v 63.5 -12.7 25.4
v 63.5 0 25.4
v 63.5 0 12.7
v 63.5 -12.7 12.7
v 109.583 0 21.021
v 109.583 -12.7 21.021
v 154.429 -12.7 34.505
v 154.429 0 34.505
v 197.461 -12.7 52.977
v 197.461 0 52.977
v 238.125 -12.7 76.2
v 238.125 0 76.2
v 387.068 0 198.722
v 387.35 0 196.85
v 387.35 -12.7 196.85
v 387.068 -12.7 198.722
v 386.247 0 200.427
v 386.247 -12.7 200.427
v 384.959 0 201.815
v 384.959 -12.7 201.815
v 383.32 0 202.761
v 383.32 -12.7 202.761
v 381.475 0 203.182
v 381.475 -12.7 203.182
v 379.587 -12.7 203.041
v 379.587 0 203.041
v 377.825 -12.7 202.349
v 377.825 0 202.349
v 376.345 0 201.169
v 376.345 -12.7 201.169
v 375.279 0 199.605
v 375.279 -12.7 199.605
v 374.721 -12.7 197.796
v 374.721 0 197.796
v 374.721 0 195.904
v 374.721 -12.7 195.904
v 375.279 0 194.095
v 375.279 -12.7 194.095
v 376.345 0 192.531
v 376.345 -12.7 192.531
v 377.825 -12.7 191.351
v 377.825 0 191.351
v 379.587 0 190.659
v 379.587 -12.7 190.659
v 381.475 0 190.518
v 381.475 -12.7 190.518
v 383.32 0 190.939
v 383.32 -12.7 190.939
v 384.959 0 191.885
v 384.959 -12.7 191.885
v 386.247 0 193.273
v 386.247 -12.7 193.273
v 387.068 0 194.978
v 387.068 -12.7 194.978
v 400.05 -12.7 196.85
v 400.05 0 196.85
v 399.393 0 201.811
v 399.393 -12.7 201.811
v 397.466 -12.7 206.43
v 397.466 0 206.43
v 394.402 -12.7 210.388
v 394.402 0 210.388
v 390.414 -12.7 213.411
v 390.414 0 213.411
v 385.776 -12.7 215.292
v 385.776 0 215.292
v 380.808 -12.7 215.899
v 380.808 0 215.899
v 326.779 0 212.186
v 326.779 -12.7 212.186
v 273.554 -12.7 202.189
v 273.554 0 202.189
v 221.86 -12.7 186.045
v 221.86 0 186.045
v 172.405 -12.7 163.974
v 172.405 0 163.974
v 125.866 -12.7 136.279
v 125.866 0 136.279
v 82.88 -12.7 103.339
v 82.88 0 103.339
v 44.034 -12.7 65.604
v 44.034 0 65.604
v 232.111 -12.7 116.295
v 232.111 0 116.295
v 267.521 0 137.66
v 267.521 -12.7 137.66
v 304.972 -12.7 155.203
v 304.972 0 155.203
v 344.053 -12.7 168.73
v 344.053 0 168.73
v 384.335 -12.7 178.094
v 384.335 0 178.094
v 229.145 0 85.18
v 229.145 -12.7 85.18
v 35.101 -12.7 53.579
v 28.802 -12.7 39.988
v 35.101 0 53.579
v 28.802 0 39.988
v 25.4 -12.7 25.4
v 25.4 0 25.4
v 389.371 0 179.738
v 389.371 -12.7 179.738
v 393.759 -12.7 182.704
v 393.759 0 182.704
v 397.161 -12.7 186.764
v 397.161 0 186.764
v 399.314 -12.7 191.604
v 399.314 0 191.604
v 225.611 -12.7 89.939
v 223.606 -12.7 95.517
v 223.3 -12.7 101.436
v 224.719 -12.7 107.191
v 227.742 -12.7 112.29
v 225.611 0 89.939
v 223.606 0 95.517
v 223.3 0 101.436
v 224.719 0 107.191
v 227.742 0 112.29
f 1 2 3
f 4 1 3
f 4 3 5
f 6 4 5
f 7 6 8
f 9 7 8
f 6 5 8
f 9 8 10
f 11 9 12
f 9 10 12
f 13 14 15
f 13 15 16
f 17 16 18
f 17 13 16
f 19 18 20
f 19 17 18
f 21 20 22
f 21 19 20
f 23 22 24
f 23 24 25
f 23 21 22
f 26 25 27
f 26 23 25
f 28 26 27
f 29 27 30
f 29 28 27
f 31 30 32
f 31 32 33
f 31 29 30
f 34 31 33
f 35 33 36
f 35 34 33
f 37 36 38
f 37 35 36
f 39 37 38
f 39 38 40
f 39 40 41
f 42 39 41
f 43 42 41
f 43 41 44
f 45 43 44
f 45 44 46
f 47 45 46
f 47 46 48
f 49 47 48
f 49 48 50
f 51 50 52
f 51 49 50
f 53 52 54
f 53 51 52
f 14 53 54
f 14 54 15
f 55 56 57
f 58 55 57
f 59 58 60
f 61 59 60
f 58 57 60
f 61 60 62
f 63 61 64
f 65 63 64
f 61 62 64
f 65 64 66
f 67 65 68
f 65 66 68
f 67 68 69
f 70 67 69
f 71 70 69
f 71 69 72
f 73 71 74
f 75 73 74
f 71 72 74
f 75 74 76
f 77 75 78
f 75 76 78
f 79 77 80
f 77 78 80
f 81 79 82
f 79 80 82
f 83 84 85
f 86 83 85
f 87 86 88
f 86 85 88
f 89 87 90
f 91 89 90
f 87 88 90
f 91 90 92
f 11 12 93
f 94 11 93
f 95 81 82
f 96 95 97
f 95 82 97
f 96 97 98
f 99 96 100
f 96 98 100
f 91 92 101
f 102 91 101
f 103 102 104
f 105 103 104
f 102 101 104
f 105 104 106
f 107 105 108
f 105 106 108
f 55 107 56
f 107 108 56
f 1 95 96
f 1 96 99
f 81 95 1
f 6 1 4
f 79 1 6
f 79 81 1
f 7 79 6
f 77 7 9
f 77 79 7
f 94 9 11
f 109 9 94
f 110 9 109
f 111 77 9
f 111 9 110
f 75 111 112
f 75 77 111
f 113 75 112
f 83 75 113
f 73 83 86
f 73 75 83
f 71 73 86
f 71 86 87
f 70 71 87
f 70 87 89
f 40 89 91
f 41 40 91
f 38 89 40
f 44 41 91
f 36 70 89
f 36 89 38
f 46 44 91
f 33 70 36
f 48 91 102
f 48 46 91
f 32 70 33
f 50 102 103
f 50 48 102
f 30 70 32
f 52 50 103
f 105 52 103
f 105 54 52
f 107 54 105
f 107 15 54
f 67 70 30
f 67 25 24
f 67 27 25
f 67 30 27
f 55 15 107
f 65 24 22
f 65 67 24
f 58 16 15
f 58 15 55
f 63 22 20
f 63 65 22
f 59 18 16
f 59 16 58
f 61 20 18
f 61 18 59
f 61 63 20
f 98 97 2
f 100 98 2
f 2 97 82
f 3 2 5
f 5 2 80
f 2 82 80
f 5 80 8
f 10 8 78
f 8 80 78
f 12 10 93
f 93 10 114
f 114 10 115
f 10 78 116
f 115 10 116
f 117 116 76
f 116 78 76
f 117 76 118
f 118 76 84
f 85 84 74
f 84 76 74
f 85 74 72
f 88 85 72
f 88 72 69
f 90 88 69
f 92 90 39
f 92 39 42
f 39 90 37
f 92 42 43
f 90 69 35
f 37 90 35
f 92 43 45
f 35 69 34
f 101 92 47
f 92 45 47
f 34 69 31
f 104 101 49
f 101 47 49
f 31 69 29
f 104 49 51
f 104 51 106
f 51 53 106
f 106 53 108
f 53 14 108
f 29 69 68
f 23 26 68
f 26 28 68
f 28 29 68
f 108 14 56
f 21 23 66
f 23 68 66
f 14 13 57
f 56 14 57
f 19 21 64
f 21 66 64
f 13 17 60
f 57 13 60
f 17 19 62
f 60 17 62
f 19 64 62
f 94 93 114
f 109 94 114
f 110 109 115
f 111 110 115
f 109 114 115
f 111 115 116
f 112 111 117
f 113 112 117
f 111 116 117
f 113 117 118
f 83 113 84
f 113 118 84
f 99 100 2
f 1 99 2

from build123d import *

# Parameters (mm, degrees)
F0_R     = 6.35
F1_DEPTH = 12.7


with BuildPart() as f1:
    # F0 (on Front) → F1 (new body)
    with BuildSketch(Plane.XZ):
        with BuildLine():
            ThreePointArc((44.034086, 65.603644), (31.603262, 46.945036), (25.4, 25.4))
            Line((25.4, 25.4), (63.5, 25.4))
            Line((63.5, 25.4), (63.5, 12.7))
            ThreePointArc((63.5, 12.7), (154.429017, 34.504579), (238.125, 76.2))
            Line((238.125, 76.2), (229.144744, 85.180256))
            ThreePointArc((229.144744, 85.180256), (223.299522, 101.436404), (232.111116, 116.295232))
            ThreePointArc((232.111116, 116.295232), (304.972177, 155.20276), (384.335327, 178.094252))
            ThreePointArc((384.335327, 178.094252), (362.032394, 195.08013), (380.807759, 215.89903))
            ThreePointArc((380.807759, 215.89903), (196.809301, 175.733004), (44.034086, 65.603644))
        make_face()
        with BuildLine():
            ThreePointArc((400.05, 196.85), (394.402244, 210.388181), (380.807759, 215.89903))
            ThreePointArc((380.807759, 215.89903), (362.032394, 195.08013), (384.335327, 178.094252))
            ThreePointArc((384.335327, 178.094252), (395.602063, 184.61553), (400.05, 196.85))
        make_face()
        with Locations((381, 196.85)):
            Circle(F0_R, mode=Mode.SUBTRACT)
    extrude(amount=F1_DEPTH)


solid = f1.part
